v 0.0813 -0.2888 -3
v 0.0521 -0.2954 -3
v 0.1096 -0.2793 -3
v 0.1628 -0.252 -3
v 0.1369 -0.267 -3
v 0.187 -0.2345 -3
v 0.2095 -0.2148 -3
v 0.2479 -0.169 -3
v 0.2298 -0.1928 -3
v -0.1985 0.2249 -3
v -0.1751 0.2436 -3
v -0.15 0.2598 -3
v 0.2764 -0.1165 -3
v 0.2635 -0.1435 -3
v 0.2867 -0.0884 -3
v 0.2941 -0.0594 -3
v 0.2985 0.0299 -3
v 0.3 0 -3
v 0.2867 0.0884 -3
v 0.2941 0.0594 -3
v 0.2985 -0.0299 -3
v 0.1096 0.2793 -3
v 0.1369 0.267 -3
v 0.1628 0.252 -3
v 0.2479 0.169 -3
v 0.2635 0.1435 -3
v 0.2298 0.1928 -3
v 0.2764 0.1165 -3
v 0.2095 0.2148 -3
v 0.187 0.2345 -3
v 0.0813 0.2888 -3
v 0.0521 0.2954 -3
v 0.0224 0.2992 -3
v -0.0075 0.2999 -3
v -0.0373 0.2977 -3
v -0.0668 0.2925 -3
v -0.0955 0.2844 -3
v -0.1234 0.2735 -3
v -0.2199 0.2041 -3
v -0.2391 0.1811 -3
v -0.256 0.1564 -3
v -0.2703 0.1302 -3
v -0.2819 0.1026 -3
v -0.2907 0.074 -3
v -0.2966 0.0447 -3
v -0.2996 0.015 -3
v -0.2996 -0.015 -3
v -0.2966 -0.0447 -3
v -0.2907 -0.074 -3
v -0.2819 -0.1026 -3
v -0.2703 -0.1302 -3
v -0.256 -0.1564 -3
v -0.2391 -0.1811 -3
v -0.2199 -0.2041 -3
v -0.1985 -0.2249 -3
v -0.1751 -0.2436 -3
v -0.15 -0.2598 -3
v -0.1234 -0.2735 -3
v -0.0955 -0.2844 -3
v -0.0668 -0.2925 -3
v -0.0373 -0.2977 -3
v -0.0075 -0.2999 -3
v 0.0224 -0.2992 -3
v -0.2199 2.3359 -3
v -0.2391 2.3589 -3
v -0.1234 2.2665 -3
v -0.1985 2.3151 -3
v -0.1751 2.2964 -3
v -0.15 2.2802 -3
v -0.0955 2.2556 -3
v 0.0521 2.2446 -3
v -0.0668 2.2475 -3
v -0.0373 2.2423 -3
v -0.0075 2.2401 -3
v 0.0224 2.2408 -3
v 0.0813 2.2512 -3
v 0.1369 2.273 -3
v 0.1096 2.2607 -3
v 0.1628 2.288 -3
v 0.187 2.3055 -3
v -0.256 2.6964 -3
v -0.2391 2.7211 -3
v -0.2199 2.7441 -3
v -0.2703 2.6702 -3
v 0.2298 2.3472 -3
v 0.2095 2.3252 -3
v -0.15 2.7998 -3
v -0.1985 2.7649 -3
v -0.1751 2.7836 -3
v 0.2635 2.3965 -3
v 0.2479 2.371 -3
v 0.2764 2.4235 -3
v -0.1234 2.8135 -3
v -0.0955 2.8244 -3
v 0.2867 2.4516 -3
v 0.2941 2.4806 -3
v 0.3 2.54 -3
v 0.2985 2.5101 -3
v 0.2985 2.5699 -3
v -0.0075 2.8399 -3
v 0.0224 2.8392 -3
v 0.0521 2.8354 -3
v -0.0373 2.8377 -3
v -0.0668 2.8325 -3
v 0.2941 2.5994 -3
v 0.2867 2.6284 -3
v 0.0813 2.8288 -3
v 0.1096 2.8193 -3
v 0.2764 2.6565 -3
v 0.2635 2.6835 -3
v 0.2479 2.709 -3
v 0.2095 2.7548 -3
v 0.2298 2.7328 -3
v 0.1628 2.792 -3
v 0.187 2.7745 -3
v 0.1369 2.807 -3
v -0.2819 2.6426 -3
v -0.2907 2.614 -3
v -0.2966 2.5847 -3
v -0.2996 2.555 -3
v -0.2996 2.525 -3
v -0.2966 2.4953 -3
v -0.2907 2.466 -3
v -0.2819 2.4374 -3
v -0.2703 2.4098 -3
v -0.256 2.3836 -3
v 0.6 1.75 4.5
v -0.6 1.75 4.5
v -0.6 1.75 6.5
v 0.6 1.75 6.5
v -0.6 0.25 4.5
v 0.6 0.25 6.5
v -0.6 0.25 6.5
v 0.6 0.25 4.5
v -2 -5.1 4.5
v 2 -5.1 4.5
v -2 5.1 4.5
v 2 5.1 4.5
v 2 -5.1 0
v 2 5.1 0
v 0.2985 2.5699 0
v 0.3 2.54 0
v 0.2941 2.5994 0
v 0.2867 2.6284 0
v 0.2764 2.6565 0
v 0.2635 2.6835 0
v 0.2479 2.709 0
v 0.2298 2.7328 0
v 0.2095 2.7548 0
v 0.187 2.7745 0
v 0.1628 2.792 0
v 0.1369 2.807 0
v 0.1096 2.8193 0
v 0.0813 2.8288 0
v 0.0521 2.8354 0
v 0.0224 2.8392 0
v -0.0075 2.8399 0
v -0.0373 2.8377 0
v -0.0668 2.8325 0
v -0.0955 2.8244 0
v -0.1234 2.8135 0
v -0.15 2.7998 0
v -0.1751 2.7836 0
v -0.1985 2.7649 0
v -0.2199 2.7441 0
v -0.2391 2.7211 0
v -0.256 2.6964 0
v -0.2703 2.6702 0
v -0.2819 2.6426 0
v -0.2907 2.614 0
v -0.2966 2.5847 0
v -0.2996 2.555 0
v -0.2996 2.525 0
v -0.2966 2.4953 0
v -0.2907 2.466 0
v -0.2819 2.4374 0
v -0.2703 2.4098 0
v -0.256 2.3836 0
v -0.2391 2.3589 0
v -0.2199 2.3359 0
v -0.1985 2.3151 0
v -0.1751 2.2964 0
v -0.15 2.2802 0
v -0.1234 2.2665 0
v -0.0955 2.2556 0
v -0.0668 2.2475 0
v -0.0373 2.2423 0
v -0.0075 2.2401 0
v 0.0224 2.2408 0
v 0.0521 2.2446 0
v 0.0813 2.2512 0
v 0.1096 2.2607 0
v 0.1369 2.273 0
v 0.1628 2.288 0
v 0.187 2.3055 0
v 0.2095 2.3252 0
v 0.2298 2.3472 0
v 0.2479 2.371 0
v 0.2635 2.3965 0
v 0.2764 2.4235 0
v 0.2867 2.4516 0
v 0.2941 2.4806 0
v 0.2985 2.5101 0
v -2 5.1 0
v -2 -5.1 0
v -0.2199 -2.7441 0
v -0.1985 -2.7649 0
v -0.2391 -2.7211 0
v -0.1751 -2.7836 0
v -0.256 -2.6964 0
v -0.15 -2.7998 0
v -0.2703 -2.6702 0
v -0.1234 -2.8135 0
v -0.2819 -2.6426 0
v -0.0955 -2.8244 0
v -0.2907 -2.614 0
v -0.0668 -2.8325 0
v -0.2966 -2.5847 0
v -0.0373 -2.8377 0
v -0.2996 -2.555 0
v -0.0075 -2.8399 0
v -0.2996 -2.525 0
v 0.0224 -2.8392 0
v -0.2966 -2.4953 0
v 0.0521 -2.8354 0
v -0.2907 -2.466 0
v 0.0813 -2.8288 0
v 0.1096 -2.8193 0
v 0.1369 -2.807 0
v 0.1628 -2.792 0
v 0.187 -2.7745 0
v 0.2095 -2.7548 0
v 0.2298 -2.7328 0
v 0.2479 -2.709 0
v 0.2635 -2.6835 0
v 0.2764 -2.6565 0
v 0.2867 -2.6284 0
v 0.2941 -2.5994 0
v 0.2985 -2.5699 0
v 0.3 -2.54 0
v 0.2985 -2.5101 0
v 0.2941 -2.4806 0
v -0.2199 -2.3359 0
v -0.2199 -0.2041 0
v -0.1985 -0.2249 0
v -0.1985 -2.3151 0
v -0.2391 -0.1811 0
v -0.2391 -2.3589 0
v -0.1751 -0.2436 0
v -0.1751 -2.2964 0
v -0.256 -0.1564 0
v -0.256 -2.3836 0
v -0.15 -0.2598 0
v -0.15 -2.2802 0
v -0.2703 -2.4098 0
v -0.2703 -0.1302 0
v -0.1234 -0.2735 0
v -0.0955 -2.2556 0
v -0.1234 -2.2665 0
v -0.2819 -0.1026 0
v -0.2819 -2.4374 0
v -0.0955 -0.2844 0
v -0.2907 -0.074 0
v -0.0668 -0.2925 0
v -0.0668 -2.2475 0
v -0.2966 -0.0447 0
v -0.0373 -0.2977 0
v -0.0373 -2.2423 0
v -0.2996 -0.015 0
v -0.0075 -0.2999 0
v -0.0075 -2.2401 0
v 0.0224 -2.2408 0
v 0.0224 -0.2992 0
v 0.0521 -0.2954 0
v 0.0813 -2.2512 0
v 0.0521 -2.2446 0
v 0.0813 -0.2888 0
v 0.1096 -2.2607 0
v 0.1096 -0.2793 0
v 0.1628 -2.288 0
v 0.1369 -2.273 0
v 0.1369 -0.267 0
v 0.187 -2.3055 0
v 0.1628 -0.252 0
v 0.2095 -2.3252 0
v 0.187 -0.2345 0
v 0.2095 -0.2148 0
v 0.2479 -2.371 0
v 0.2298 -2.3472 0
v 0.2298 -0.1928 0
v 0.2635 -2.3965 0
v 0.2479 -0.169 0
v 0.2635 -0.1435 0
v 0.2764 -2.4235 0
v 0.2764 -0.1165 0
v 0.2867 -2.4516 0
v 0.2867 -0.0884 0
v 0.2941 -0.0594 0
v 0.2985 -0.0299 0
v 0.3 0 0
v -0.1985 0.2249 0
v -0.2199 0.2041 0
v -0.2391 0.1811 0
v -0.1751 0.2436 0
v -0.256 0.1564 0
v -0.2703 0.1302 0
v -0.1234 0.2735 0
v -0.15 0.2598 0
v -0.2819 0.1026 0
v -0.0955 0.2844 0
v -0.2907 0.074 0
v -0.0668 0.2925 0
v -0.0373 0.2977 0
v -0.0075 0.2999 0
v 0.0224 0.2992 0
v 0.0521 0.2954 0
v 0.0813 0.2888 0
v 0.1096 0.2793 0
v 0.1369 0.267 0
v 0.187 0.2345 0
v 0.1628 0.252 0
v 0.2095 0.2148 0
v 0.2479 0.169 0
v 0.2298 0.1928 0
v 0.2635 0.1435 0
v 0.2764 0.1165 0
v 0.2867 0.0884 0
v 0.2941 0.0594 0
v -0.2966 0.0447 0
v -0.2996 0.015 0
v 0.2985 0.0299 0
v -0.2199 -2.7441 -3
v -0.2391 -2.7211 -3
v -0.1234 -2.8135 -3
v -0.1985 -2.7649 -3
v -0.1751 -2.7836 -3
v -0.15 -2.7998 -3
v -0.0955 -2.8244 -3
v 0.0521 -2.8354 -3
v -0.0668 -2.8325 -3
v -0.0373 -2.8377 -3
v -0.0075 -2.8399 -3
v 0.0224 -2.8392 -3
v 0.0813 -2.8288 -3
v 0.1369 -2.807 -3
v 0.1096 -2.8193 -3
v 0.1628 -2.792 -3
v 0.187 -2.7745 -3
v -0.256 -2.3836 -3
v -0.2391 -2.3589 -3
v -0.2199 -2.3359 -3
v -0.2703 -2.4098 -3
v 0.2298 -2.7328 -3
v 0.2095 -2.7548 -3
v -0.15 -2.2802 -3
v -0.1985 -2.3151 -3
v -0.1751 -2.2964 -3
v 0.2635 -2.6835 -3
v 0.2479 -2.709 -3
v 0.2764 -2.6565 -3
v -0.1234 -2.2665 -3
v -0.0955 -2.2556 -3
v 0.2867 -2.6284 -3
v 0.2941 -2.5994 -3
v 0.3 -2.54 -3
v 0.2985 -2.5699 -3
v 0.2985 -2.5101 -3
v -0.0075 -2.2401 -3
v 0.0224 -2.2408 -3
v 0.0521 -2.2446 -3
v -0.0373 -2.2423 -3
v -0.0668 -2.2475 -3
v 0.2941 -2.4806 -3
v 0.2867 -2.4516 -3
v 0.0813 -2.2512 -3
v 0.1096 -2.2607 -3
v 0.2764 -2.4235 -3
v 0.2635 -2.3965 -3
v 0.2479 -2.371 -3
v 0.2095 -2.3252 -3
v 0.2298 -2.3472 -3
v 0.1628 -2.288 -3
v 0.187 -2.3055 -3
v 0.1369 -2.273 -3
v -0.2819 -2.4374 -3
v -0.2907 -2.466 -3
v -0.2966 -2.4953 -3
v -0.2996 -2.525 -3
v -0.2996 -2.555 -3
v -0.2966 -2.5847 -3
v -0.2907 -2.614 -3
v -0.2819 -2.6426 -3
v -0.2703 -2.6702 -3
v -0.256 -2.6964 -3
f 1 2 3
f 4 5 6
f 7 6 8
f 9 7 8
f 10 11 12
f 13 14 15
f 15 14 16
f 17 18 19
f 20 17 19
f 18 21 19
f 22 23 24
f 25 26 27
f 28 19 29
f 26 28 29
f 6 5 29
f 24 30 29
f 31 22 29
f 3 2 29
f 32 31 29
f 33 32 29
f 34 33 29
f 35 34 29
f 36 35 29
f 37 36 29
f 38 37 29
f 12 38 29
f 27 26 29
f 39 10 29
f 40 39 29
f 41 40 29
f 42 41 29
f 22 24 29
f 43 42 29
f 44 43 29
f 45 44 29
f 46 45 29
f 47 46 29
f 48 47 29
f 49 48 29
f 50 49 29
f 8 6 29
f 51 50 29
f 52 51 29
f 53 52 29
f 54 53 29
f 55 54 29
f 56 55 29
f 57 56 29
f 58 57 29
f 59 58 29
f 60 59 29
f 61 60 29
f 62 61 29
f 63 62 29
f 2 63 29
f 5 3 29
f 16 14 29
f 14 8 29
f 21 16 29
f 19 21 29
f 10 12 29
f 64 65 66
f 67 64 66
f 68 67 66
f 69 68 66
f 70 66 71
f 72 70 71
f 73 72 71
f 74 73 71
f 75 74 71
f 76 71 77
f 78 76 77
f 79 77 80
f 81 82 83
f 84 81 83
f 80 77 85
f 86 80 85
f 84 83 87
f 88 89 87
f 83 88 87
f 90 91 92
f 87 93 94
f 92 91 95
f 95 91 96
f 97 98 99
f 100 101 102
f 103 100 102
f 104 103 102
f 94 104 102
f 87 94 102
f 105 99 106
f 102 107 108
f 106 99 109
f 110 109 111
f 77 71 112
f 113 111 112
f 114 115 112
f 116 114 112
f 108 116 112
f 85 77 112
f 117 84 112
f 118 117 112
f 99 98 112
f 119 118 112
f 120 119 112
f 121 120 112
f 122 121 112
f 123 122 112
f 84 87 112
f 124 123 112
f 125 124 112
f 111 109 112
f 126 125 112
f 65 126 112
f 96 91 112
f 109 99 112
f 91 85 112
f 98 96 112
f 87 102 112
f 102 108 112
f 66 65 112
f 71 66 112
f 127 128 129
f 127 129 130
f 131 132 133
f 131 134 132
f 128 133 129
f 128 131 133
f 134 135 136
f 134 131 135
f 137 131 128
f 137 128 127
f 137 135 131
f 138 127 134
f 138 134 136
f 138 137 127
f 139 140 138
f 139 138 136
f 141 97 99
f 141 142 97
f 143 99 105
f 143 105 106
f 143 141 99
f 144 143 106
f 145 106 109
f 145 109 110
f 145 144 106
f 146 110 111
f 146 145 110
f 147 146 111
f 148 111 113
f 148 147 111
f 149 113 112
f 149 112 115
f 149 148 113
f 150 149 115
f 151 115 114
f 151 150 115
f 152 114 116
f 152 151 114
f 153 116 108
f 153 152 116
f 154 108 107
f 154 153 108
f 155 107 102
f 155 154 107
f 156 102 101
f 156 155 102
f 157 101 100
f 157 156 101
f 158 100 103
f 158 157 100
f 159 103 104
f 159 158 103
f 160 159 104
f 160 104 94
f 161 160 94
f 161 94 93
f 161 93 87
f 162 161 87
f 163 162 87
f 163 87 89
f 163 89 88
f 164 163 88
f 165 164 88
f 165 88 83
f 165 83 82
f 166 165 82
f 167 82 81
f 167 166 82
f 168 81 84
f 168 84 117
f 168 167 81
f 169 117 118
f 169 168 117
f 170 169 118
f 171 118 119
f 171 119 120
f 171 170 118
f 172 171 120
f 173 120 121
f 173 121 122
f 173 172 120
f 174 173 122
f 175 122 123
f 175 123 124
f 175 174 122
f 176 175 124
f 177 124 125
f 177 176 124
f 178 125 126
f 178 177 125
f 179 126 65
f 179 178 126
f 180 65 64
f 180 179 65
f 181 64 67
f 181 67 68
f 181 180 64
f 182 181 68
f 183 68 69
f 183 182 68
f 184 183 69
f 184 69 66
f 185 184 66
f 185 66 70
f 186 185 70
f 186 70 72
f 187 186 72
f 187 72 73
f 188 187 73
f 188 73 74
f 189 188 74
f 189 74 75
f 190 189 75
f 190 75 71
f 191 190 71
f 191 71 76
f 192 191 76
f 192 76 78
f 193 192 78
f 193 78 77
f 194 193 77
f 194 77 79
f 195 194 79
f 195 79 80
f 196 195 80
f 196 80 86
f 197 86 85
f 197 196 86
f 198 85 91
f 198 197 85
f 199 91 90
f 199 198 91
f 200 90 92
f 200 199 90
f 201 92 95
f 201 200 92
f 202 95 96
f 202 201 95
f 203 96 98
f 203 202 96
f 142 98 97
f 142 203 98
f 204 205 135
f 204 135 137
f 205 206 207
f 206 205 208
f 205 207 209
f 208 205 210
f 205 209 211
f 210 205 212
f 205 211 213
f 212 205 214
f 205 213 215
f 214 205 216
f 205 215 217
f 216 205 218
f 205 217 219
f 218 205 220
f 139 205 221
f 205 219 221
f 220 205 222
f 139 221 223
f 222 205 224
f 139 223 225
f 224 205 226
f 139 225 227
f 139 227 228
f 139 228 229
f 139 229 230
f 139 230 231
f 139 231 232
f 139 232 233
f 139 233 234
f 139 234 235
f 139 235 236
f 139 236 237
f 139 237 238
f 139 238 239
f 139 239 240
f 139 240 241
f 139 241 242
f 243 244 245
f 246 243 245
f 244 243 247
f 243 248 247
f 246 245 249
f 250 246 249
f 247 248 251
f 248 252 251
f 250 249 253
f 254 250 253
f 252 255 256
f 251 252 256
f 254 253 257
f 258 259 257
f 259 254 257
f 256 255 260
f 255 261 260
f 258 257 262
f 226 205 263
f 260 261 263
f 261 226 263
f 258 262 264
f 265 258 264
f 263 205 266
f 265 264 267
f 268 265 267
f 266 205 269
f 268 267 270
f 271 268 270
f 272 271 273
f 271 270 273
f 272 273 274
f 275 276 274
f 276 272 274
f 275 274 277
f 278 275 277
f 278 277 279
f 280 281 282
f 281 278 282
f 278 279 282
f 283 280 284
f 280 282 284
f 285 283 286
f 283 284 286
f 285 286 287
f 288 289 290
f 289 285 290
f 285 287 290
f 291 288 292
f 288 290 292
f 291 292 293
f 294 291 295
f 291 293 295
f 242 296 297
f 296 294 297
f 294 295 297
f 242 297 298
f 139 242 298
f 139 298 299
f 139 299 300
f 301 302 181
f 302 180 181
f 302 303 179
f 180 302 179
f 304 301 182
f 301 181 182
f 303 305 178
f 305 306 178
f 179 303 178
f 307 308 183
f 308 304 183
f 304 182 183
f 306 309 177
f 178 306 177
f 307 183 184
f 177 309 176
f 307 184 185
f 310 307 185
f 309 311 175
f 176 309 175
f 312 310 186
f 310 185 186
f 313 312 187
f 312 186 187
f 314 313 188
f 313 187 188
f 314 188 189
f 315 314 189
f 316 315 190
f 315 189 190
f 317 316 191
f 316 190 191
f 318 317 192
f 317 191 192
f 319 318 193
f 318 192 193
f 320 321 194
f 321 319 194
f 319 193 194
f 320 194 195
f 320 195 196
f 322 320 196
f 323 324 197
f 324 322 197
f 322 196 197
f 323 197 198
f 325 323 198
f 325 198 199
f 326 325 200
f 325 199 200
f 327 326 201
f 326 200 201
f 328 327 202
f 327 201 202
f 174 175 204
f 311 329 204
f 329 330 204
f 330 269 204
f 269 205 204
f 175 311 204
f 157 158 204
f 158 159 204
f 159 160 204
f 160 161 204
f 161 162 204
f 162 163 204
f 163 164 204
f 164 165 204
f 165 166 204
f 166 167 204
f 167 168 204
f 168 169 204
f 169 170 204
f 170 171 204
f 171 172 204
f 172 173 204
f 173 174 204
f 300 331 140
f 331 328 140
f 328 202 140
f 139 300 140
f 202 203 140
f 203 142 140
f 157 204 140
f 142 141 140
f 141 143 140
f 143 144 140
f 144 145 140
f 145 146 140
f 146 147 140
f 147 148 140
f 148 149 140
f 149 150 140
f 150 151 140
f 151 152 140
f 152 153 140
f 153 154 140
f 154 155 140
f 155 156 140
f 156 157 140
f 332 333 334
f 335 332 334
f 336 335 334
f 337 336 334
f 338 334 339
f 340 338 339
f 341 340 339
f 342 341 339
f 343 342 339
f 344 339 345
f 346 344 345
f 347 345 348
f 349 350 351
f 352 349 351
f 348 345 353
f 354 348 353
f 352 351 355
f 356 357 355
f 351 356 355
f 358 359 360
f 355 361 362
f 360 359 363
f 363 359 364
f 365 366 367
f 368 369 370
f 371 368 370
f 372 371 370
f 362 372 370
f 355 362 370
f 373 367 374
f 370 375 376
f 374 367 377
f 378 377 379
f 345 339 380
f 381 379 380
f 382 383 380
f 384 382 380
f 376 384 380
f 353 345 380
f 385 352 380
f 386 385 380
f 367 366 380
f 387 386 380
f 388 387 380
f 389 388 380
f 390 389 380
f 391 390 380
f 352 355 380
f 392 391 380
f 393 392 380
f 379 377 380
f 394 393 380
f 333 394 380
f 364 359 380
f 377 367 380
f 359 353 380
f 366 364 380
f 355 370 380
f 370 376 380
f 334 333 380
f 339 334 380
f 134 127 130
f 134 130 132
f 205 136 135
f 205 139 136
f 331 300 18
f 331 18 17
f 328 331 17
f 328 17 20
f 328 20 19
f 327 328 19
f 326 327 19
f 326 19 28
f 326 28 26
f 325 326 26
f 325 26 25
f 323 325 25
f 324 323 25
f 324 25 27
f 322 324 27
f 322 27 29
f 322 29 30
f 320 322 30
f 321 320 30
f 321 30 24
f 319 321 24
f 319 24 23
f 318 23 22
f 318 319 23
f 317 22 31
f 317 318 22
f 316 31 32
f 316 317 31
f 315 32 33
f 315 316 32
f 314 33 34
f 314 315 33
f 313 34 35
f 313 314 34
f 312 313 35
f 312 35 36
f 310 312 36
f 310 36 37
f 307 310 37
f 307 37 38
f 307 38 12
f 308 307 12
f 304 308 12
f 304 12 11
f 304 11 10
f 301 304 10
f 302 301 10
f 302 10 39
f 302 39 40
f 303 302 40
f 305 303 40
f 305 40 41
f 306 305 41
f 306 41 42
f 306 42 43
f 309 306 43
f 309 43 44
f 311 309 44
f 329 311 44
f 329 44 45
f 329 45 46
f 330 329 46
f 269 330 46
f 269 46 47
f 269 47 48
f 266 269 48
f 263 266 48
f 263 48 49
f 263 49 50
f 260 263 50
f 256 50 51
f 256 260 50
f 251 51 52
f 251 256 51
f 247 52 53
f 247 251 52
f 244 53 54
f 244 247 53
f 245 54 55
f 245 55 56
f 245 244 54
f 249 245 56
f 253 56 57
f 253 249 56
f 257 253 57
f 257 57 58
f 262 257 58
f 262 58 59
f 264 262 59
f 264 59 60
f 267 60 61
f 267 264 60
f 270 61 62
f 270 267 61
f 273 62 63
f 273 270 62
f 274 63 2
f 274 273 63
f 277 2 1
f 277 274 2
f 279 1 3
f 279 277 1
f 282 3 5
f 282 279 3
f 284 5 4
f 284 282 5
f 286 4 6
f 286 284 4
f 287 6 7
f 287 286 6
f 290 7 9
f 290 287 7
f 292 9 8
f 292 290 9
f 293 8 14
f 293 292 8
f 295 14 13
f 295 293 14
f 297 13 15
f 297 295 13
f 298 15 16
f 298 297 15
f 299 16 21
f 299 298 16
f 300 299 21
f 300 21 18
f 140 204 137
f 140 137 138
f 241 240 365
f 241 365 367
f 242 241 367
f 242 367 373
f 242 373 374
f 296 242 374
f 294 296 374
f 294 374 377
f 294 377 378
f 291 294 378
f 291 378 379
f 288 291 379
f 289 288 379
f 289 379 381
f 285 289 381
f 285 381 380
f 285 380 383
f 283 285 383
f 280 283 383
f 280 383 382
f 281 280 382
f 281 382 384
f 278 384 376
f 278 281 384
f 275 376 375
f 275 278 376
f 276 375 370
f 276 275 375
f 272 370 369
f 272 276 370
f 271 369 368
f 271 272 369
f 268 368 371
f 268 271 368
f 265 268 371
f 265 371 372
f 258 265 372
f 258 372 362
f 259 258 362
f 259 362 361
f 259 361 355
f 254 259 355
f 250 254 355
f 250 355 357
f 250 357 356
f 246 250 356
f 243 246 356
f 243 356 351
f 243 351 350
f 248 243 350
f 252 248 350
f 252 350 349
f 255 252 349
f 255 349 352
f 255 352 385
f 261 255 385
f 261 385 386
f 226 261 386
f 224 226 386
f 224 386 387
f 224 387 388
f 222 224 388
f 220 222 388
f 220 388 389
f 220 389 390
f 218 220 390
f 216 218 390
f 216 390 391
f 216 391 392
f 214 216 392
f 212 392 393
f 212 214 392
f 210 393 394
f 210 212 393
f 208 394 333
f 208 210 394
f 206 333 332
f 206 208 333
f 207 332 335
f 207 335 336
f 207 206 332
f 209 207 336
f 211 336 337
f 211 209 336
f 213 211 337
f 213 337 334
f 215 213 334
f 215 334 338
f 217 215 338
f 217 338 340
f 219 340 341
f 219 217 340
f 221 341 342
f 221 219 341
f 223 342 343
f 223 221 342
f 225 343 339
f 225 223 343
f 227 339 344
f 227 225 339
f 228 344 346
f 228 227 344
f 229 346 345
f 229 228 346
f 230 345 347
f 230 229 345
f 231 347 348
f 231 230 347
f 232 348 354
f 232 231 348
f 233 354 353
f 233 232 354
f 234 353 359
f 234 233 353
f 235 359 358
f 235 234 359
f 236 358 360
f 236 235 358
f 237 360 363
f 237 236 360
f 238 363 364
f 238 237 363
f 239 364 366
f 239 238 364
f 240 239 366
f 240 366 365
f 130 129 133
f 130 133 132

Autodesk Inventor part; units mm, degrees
sketch "スケッチ1" plane through (0, 0, 0) normal (0, 0, 1) x (1, 0, 0)
  line L0 (-2, 5.1) -> (2, 5.1)
  line L1 (2, 5.1) -> (2, -5.1)
  line L2 (2, -5.1) -> (-2, -5.1)
  line L3 (-2, -5.1) -> (-2, 5.1)
  point P0 (0, 0)
  dimension "d0" = 2
  dimension "d1" = 4
  dimension "d2" = 5.1
  dimension "d3" = 10.2
extrude "押し出し1" add sketch "スケッチ1" along normal blind 4.5
sketch "スケッチ4" plane through (0, 0, 0) normal (0, 0, 1) x (1, 0, 0)
  circle A0 centre (0, 2.54) radius 0.3
  circle A1 centre (0, 0) radius 0.3
  circle A2 centre (0, -2.54) radius 0.3
  dimension "d16" = 0.6
  dimension "d17" = 0.6
  dimension "d18" = 0.6
  dimension "d19" = 2.54
  dimension "d20" = 2.54
extrude "押し出し3" add sketch "スケッチ4" against normal blind 3
sketch "スケッチ5" plane through (0, 0, 0) normal (0, 0, 1) x (1, 0, 0)
  line L0 (-0.6, 1.75) -> (0.6, 1.75)
  line L1 (0.6, 1.75) -> (0.6, 0.25)
  line L2 (0.6, 0.25) -> (-0.6, 0.25)
  line L3 (-0.6, 0.25) -> (-0.6, 1.75)
  line L4 (0.6, 0.25) -> (-0.6, 1.75)
  line L5 (0.6, 1.75) -> (-0.6, 0.25)
  line L6 (0, -0.35) -> (0, 2.1) projected
  line L7 (-0.84, 0) -> (0.84, 0) projected
  point P0 (0, 0)
  point P1 (0, 1)
  point P2 (0, 1)
  dimension "d23" = 1
  dimension "d24" = 1.5
  dimension "d25" = 1.2
extrude "押し出し4" add sketch "スケッチ5" along normal blind 6.5
properties part number "SS-12SDP2"
